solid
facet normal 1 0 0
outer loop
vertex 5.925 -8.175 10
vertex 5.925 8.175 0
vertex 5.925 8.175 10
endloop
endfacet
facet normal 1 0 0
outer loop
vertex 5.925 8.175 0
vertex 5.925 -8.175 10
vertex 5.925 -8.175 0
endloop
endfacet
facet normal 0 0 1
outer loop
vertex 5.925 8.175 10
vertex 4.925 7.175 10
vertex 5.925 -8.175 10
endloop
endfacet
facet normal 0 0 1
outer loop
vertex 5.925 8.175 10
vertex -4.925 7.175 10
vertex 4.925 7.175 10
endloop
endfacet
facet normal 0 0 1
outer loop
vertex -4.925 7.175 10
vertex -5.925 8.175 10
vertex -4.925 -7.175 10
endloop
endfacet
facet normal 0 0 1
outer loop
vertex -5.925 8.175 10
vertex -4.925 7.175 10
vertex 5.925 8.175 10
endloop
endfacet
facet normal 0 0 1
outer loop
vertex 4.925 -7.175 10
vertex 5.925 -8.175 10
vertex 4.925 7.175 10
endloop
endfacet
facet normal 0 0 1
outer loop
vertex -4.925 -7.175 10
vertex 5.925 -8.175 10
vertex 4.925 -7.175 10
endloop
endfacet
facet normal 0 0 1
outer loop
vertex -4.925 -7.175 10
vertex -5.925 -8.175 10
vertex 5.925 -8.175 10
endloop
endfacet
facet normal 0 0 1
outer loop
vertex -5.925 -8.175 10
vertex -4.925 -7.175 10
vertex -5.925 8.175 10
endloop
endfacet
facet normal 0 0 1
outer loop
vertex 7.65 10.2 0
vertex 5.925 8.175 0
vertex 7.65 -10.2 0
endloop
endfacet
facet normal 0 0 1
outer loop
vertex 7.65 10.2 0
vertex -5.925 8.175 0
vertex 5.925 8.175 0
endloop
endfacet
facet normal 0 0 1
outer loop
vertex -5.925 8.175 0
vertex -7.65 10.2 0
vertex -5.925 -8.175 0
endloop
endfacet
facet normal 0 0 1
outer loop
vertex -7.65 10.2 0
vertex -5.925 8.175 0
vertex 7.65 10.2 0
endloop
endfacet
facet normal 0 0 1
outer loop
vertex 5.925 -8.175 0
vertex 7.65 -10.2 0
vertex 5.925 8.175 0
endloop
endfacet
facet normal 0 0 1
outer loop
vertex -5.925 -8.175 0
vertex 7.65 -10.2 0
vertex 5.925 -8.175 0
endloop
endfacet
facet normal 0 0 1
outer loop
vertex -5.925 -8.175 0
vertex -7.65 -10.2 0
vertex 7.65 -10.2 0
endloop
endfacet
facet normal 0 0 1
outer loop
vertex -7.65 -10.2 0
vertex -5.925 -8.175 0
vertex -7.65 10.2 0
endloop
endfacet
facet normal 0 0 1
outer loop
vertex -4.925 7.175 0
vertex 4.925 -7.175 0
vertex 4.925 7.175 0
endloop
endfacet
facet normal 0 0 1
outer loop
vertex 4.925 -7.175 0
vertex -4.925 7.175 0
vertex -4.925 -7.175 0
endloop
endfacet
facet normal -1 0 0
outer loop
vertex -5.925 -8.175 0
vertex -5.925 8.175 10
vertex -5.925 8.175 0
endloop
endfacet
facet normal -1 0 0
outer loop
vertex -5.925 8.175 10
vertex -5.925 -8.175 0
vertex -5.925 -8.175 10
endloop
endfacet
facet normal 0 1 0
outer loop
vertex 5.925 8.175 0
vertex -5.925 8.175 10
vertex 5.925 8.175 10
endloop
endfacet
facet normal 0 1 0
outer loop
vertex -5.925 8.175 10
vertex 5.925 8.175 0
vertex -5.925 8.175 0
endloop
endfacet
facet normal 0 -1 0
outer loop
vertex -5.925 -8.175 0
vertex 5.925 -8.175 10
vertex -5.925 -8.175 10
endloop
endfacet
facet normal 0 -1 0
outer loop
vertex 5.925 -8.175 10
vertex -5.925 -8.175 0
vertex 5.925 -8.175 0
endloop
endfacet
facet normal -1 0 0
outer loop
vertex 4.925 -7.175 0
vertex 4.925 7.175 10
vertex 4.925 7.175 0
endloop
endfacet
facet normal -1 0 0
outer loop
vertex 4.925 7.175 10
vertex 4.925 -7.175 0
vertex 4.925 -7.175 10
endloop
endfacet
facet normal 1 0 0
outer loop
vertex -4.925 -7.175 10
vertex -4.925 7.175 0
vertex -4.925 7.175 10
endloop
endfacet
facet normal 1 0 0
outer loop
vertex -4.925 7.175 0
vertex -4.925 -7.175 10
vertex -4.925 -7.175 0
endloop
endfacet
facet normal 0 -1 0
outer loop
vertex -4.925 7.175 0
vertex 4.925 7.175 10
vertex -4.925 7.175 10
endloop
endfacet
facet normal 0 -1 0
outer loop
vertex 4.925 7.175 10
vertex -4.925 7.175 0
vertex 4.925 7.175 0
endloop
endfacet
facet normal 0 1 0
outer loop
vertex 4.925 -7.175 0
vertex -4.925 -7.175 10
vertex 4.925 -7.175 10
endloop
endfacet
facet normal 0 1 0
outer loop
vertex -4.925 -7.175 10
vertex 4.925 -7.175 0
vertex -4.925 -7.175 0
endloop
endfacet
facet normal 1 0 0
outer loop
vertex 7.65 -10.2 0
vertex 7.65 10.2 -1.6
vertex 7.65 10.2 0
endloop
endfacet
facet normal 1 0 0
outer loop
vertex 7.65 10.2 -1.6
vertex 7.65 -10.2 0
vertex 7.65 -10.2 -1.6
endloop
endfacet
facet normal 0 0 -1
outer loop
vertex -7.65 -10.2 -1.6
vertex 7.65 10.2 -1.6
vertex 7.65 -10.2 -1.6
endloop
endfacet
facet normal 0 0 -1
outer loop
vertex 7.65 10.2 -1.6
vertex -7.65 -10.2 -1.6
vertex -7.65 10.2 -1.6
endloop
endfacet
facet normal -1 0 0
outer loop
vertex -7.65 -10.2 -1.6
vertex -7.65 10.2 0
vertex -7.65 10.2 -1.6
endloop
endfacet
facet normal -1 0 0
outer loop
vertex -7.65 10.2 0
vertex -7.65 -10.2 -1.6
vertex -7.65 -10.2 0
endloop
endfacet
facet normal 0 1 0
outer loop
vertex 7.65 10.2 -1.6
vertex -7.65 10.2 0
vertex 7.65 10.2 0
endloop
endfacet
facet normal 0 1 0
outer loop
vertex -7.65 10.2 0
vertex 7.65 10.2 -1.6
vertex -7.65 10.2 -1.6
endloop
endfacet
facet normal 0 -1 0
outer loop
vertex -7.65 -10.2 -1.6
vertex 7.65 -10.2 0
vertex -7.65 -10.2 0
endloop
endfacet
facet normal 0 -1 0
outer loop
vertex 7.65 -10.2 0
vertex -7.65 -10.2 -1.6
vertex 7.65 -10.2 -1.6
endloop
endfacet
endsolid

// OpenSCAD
delta = $preview ? 0.005 : 0; //for better preview rendering

gap  = 0.15;
inner_x = 12.0 - gap;
inner_y = 16.5 - gap;

outer_x = 15.3;
outer_y = 20.4;

thickness = 0.2 * 8;
in_length = 10;
wall = 1;

translate([0, 0, -thickness/2])
  cube([outer_x, outer_y, thickness], center=true);

translate([0, 0, in_length/2]) difference() {
  cube([inner_x, inner_y, in_length], center=true);
  cube([inner_x-2*wall, inner_y-2*wall, in_length+2*delta], center=true);
}
